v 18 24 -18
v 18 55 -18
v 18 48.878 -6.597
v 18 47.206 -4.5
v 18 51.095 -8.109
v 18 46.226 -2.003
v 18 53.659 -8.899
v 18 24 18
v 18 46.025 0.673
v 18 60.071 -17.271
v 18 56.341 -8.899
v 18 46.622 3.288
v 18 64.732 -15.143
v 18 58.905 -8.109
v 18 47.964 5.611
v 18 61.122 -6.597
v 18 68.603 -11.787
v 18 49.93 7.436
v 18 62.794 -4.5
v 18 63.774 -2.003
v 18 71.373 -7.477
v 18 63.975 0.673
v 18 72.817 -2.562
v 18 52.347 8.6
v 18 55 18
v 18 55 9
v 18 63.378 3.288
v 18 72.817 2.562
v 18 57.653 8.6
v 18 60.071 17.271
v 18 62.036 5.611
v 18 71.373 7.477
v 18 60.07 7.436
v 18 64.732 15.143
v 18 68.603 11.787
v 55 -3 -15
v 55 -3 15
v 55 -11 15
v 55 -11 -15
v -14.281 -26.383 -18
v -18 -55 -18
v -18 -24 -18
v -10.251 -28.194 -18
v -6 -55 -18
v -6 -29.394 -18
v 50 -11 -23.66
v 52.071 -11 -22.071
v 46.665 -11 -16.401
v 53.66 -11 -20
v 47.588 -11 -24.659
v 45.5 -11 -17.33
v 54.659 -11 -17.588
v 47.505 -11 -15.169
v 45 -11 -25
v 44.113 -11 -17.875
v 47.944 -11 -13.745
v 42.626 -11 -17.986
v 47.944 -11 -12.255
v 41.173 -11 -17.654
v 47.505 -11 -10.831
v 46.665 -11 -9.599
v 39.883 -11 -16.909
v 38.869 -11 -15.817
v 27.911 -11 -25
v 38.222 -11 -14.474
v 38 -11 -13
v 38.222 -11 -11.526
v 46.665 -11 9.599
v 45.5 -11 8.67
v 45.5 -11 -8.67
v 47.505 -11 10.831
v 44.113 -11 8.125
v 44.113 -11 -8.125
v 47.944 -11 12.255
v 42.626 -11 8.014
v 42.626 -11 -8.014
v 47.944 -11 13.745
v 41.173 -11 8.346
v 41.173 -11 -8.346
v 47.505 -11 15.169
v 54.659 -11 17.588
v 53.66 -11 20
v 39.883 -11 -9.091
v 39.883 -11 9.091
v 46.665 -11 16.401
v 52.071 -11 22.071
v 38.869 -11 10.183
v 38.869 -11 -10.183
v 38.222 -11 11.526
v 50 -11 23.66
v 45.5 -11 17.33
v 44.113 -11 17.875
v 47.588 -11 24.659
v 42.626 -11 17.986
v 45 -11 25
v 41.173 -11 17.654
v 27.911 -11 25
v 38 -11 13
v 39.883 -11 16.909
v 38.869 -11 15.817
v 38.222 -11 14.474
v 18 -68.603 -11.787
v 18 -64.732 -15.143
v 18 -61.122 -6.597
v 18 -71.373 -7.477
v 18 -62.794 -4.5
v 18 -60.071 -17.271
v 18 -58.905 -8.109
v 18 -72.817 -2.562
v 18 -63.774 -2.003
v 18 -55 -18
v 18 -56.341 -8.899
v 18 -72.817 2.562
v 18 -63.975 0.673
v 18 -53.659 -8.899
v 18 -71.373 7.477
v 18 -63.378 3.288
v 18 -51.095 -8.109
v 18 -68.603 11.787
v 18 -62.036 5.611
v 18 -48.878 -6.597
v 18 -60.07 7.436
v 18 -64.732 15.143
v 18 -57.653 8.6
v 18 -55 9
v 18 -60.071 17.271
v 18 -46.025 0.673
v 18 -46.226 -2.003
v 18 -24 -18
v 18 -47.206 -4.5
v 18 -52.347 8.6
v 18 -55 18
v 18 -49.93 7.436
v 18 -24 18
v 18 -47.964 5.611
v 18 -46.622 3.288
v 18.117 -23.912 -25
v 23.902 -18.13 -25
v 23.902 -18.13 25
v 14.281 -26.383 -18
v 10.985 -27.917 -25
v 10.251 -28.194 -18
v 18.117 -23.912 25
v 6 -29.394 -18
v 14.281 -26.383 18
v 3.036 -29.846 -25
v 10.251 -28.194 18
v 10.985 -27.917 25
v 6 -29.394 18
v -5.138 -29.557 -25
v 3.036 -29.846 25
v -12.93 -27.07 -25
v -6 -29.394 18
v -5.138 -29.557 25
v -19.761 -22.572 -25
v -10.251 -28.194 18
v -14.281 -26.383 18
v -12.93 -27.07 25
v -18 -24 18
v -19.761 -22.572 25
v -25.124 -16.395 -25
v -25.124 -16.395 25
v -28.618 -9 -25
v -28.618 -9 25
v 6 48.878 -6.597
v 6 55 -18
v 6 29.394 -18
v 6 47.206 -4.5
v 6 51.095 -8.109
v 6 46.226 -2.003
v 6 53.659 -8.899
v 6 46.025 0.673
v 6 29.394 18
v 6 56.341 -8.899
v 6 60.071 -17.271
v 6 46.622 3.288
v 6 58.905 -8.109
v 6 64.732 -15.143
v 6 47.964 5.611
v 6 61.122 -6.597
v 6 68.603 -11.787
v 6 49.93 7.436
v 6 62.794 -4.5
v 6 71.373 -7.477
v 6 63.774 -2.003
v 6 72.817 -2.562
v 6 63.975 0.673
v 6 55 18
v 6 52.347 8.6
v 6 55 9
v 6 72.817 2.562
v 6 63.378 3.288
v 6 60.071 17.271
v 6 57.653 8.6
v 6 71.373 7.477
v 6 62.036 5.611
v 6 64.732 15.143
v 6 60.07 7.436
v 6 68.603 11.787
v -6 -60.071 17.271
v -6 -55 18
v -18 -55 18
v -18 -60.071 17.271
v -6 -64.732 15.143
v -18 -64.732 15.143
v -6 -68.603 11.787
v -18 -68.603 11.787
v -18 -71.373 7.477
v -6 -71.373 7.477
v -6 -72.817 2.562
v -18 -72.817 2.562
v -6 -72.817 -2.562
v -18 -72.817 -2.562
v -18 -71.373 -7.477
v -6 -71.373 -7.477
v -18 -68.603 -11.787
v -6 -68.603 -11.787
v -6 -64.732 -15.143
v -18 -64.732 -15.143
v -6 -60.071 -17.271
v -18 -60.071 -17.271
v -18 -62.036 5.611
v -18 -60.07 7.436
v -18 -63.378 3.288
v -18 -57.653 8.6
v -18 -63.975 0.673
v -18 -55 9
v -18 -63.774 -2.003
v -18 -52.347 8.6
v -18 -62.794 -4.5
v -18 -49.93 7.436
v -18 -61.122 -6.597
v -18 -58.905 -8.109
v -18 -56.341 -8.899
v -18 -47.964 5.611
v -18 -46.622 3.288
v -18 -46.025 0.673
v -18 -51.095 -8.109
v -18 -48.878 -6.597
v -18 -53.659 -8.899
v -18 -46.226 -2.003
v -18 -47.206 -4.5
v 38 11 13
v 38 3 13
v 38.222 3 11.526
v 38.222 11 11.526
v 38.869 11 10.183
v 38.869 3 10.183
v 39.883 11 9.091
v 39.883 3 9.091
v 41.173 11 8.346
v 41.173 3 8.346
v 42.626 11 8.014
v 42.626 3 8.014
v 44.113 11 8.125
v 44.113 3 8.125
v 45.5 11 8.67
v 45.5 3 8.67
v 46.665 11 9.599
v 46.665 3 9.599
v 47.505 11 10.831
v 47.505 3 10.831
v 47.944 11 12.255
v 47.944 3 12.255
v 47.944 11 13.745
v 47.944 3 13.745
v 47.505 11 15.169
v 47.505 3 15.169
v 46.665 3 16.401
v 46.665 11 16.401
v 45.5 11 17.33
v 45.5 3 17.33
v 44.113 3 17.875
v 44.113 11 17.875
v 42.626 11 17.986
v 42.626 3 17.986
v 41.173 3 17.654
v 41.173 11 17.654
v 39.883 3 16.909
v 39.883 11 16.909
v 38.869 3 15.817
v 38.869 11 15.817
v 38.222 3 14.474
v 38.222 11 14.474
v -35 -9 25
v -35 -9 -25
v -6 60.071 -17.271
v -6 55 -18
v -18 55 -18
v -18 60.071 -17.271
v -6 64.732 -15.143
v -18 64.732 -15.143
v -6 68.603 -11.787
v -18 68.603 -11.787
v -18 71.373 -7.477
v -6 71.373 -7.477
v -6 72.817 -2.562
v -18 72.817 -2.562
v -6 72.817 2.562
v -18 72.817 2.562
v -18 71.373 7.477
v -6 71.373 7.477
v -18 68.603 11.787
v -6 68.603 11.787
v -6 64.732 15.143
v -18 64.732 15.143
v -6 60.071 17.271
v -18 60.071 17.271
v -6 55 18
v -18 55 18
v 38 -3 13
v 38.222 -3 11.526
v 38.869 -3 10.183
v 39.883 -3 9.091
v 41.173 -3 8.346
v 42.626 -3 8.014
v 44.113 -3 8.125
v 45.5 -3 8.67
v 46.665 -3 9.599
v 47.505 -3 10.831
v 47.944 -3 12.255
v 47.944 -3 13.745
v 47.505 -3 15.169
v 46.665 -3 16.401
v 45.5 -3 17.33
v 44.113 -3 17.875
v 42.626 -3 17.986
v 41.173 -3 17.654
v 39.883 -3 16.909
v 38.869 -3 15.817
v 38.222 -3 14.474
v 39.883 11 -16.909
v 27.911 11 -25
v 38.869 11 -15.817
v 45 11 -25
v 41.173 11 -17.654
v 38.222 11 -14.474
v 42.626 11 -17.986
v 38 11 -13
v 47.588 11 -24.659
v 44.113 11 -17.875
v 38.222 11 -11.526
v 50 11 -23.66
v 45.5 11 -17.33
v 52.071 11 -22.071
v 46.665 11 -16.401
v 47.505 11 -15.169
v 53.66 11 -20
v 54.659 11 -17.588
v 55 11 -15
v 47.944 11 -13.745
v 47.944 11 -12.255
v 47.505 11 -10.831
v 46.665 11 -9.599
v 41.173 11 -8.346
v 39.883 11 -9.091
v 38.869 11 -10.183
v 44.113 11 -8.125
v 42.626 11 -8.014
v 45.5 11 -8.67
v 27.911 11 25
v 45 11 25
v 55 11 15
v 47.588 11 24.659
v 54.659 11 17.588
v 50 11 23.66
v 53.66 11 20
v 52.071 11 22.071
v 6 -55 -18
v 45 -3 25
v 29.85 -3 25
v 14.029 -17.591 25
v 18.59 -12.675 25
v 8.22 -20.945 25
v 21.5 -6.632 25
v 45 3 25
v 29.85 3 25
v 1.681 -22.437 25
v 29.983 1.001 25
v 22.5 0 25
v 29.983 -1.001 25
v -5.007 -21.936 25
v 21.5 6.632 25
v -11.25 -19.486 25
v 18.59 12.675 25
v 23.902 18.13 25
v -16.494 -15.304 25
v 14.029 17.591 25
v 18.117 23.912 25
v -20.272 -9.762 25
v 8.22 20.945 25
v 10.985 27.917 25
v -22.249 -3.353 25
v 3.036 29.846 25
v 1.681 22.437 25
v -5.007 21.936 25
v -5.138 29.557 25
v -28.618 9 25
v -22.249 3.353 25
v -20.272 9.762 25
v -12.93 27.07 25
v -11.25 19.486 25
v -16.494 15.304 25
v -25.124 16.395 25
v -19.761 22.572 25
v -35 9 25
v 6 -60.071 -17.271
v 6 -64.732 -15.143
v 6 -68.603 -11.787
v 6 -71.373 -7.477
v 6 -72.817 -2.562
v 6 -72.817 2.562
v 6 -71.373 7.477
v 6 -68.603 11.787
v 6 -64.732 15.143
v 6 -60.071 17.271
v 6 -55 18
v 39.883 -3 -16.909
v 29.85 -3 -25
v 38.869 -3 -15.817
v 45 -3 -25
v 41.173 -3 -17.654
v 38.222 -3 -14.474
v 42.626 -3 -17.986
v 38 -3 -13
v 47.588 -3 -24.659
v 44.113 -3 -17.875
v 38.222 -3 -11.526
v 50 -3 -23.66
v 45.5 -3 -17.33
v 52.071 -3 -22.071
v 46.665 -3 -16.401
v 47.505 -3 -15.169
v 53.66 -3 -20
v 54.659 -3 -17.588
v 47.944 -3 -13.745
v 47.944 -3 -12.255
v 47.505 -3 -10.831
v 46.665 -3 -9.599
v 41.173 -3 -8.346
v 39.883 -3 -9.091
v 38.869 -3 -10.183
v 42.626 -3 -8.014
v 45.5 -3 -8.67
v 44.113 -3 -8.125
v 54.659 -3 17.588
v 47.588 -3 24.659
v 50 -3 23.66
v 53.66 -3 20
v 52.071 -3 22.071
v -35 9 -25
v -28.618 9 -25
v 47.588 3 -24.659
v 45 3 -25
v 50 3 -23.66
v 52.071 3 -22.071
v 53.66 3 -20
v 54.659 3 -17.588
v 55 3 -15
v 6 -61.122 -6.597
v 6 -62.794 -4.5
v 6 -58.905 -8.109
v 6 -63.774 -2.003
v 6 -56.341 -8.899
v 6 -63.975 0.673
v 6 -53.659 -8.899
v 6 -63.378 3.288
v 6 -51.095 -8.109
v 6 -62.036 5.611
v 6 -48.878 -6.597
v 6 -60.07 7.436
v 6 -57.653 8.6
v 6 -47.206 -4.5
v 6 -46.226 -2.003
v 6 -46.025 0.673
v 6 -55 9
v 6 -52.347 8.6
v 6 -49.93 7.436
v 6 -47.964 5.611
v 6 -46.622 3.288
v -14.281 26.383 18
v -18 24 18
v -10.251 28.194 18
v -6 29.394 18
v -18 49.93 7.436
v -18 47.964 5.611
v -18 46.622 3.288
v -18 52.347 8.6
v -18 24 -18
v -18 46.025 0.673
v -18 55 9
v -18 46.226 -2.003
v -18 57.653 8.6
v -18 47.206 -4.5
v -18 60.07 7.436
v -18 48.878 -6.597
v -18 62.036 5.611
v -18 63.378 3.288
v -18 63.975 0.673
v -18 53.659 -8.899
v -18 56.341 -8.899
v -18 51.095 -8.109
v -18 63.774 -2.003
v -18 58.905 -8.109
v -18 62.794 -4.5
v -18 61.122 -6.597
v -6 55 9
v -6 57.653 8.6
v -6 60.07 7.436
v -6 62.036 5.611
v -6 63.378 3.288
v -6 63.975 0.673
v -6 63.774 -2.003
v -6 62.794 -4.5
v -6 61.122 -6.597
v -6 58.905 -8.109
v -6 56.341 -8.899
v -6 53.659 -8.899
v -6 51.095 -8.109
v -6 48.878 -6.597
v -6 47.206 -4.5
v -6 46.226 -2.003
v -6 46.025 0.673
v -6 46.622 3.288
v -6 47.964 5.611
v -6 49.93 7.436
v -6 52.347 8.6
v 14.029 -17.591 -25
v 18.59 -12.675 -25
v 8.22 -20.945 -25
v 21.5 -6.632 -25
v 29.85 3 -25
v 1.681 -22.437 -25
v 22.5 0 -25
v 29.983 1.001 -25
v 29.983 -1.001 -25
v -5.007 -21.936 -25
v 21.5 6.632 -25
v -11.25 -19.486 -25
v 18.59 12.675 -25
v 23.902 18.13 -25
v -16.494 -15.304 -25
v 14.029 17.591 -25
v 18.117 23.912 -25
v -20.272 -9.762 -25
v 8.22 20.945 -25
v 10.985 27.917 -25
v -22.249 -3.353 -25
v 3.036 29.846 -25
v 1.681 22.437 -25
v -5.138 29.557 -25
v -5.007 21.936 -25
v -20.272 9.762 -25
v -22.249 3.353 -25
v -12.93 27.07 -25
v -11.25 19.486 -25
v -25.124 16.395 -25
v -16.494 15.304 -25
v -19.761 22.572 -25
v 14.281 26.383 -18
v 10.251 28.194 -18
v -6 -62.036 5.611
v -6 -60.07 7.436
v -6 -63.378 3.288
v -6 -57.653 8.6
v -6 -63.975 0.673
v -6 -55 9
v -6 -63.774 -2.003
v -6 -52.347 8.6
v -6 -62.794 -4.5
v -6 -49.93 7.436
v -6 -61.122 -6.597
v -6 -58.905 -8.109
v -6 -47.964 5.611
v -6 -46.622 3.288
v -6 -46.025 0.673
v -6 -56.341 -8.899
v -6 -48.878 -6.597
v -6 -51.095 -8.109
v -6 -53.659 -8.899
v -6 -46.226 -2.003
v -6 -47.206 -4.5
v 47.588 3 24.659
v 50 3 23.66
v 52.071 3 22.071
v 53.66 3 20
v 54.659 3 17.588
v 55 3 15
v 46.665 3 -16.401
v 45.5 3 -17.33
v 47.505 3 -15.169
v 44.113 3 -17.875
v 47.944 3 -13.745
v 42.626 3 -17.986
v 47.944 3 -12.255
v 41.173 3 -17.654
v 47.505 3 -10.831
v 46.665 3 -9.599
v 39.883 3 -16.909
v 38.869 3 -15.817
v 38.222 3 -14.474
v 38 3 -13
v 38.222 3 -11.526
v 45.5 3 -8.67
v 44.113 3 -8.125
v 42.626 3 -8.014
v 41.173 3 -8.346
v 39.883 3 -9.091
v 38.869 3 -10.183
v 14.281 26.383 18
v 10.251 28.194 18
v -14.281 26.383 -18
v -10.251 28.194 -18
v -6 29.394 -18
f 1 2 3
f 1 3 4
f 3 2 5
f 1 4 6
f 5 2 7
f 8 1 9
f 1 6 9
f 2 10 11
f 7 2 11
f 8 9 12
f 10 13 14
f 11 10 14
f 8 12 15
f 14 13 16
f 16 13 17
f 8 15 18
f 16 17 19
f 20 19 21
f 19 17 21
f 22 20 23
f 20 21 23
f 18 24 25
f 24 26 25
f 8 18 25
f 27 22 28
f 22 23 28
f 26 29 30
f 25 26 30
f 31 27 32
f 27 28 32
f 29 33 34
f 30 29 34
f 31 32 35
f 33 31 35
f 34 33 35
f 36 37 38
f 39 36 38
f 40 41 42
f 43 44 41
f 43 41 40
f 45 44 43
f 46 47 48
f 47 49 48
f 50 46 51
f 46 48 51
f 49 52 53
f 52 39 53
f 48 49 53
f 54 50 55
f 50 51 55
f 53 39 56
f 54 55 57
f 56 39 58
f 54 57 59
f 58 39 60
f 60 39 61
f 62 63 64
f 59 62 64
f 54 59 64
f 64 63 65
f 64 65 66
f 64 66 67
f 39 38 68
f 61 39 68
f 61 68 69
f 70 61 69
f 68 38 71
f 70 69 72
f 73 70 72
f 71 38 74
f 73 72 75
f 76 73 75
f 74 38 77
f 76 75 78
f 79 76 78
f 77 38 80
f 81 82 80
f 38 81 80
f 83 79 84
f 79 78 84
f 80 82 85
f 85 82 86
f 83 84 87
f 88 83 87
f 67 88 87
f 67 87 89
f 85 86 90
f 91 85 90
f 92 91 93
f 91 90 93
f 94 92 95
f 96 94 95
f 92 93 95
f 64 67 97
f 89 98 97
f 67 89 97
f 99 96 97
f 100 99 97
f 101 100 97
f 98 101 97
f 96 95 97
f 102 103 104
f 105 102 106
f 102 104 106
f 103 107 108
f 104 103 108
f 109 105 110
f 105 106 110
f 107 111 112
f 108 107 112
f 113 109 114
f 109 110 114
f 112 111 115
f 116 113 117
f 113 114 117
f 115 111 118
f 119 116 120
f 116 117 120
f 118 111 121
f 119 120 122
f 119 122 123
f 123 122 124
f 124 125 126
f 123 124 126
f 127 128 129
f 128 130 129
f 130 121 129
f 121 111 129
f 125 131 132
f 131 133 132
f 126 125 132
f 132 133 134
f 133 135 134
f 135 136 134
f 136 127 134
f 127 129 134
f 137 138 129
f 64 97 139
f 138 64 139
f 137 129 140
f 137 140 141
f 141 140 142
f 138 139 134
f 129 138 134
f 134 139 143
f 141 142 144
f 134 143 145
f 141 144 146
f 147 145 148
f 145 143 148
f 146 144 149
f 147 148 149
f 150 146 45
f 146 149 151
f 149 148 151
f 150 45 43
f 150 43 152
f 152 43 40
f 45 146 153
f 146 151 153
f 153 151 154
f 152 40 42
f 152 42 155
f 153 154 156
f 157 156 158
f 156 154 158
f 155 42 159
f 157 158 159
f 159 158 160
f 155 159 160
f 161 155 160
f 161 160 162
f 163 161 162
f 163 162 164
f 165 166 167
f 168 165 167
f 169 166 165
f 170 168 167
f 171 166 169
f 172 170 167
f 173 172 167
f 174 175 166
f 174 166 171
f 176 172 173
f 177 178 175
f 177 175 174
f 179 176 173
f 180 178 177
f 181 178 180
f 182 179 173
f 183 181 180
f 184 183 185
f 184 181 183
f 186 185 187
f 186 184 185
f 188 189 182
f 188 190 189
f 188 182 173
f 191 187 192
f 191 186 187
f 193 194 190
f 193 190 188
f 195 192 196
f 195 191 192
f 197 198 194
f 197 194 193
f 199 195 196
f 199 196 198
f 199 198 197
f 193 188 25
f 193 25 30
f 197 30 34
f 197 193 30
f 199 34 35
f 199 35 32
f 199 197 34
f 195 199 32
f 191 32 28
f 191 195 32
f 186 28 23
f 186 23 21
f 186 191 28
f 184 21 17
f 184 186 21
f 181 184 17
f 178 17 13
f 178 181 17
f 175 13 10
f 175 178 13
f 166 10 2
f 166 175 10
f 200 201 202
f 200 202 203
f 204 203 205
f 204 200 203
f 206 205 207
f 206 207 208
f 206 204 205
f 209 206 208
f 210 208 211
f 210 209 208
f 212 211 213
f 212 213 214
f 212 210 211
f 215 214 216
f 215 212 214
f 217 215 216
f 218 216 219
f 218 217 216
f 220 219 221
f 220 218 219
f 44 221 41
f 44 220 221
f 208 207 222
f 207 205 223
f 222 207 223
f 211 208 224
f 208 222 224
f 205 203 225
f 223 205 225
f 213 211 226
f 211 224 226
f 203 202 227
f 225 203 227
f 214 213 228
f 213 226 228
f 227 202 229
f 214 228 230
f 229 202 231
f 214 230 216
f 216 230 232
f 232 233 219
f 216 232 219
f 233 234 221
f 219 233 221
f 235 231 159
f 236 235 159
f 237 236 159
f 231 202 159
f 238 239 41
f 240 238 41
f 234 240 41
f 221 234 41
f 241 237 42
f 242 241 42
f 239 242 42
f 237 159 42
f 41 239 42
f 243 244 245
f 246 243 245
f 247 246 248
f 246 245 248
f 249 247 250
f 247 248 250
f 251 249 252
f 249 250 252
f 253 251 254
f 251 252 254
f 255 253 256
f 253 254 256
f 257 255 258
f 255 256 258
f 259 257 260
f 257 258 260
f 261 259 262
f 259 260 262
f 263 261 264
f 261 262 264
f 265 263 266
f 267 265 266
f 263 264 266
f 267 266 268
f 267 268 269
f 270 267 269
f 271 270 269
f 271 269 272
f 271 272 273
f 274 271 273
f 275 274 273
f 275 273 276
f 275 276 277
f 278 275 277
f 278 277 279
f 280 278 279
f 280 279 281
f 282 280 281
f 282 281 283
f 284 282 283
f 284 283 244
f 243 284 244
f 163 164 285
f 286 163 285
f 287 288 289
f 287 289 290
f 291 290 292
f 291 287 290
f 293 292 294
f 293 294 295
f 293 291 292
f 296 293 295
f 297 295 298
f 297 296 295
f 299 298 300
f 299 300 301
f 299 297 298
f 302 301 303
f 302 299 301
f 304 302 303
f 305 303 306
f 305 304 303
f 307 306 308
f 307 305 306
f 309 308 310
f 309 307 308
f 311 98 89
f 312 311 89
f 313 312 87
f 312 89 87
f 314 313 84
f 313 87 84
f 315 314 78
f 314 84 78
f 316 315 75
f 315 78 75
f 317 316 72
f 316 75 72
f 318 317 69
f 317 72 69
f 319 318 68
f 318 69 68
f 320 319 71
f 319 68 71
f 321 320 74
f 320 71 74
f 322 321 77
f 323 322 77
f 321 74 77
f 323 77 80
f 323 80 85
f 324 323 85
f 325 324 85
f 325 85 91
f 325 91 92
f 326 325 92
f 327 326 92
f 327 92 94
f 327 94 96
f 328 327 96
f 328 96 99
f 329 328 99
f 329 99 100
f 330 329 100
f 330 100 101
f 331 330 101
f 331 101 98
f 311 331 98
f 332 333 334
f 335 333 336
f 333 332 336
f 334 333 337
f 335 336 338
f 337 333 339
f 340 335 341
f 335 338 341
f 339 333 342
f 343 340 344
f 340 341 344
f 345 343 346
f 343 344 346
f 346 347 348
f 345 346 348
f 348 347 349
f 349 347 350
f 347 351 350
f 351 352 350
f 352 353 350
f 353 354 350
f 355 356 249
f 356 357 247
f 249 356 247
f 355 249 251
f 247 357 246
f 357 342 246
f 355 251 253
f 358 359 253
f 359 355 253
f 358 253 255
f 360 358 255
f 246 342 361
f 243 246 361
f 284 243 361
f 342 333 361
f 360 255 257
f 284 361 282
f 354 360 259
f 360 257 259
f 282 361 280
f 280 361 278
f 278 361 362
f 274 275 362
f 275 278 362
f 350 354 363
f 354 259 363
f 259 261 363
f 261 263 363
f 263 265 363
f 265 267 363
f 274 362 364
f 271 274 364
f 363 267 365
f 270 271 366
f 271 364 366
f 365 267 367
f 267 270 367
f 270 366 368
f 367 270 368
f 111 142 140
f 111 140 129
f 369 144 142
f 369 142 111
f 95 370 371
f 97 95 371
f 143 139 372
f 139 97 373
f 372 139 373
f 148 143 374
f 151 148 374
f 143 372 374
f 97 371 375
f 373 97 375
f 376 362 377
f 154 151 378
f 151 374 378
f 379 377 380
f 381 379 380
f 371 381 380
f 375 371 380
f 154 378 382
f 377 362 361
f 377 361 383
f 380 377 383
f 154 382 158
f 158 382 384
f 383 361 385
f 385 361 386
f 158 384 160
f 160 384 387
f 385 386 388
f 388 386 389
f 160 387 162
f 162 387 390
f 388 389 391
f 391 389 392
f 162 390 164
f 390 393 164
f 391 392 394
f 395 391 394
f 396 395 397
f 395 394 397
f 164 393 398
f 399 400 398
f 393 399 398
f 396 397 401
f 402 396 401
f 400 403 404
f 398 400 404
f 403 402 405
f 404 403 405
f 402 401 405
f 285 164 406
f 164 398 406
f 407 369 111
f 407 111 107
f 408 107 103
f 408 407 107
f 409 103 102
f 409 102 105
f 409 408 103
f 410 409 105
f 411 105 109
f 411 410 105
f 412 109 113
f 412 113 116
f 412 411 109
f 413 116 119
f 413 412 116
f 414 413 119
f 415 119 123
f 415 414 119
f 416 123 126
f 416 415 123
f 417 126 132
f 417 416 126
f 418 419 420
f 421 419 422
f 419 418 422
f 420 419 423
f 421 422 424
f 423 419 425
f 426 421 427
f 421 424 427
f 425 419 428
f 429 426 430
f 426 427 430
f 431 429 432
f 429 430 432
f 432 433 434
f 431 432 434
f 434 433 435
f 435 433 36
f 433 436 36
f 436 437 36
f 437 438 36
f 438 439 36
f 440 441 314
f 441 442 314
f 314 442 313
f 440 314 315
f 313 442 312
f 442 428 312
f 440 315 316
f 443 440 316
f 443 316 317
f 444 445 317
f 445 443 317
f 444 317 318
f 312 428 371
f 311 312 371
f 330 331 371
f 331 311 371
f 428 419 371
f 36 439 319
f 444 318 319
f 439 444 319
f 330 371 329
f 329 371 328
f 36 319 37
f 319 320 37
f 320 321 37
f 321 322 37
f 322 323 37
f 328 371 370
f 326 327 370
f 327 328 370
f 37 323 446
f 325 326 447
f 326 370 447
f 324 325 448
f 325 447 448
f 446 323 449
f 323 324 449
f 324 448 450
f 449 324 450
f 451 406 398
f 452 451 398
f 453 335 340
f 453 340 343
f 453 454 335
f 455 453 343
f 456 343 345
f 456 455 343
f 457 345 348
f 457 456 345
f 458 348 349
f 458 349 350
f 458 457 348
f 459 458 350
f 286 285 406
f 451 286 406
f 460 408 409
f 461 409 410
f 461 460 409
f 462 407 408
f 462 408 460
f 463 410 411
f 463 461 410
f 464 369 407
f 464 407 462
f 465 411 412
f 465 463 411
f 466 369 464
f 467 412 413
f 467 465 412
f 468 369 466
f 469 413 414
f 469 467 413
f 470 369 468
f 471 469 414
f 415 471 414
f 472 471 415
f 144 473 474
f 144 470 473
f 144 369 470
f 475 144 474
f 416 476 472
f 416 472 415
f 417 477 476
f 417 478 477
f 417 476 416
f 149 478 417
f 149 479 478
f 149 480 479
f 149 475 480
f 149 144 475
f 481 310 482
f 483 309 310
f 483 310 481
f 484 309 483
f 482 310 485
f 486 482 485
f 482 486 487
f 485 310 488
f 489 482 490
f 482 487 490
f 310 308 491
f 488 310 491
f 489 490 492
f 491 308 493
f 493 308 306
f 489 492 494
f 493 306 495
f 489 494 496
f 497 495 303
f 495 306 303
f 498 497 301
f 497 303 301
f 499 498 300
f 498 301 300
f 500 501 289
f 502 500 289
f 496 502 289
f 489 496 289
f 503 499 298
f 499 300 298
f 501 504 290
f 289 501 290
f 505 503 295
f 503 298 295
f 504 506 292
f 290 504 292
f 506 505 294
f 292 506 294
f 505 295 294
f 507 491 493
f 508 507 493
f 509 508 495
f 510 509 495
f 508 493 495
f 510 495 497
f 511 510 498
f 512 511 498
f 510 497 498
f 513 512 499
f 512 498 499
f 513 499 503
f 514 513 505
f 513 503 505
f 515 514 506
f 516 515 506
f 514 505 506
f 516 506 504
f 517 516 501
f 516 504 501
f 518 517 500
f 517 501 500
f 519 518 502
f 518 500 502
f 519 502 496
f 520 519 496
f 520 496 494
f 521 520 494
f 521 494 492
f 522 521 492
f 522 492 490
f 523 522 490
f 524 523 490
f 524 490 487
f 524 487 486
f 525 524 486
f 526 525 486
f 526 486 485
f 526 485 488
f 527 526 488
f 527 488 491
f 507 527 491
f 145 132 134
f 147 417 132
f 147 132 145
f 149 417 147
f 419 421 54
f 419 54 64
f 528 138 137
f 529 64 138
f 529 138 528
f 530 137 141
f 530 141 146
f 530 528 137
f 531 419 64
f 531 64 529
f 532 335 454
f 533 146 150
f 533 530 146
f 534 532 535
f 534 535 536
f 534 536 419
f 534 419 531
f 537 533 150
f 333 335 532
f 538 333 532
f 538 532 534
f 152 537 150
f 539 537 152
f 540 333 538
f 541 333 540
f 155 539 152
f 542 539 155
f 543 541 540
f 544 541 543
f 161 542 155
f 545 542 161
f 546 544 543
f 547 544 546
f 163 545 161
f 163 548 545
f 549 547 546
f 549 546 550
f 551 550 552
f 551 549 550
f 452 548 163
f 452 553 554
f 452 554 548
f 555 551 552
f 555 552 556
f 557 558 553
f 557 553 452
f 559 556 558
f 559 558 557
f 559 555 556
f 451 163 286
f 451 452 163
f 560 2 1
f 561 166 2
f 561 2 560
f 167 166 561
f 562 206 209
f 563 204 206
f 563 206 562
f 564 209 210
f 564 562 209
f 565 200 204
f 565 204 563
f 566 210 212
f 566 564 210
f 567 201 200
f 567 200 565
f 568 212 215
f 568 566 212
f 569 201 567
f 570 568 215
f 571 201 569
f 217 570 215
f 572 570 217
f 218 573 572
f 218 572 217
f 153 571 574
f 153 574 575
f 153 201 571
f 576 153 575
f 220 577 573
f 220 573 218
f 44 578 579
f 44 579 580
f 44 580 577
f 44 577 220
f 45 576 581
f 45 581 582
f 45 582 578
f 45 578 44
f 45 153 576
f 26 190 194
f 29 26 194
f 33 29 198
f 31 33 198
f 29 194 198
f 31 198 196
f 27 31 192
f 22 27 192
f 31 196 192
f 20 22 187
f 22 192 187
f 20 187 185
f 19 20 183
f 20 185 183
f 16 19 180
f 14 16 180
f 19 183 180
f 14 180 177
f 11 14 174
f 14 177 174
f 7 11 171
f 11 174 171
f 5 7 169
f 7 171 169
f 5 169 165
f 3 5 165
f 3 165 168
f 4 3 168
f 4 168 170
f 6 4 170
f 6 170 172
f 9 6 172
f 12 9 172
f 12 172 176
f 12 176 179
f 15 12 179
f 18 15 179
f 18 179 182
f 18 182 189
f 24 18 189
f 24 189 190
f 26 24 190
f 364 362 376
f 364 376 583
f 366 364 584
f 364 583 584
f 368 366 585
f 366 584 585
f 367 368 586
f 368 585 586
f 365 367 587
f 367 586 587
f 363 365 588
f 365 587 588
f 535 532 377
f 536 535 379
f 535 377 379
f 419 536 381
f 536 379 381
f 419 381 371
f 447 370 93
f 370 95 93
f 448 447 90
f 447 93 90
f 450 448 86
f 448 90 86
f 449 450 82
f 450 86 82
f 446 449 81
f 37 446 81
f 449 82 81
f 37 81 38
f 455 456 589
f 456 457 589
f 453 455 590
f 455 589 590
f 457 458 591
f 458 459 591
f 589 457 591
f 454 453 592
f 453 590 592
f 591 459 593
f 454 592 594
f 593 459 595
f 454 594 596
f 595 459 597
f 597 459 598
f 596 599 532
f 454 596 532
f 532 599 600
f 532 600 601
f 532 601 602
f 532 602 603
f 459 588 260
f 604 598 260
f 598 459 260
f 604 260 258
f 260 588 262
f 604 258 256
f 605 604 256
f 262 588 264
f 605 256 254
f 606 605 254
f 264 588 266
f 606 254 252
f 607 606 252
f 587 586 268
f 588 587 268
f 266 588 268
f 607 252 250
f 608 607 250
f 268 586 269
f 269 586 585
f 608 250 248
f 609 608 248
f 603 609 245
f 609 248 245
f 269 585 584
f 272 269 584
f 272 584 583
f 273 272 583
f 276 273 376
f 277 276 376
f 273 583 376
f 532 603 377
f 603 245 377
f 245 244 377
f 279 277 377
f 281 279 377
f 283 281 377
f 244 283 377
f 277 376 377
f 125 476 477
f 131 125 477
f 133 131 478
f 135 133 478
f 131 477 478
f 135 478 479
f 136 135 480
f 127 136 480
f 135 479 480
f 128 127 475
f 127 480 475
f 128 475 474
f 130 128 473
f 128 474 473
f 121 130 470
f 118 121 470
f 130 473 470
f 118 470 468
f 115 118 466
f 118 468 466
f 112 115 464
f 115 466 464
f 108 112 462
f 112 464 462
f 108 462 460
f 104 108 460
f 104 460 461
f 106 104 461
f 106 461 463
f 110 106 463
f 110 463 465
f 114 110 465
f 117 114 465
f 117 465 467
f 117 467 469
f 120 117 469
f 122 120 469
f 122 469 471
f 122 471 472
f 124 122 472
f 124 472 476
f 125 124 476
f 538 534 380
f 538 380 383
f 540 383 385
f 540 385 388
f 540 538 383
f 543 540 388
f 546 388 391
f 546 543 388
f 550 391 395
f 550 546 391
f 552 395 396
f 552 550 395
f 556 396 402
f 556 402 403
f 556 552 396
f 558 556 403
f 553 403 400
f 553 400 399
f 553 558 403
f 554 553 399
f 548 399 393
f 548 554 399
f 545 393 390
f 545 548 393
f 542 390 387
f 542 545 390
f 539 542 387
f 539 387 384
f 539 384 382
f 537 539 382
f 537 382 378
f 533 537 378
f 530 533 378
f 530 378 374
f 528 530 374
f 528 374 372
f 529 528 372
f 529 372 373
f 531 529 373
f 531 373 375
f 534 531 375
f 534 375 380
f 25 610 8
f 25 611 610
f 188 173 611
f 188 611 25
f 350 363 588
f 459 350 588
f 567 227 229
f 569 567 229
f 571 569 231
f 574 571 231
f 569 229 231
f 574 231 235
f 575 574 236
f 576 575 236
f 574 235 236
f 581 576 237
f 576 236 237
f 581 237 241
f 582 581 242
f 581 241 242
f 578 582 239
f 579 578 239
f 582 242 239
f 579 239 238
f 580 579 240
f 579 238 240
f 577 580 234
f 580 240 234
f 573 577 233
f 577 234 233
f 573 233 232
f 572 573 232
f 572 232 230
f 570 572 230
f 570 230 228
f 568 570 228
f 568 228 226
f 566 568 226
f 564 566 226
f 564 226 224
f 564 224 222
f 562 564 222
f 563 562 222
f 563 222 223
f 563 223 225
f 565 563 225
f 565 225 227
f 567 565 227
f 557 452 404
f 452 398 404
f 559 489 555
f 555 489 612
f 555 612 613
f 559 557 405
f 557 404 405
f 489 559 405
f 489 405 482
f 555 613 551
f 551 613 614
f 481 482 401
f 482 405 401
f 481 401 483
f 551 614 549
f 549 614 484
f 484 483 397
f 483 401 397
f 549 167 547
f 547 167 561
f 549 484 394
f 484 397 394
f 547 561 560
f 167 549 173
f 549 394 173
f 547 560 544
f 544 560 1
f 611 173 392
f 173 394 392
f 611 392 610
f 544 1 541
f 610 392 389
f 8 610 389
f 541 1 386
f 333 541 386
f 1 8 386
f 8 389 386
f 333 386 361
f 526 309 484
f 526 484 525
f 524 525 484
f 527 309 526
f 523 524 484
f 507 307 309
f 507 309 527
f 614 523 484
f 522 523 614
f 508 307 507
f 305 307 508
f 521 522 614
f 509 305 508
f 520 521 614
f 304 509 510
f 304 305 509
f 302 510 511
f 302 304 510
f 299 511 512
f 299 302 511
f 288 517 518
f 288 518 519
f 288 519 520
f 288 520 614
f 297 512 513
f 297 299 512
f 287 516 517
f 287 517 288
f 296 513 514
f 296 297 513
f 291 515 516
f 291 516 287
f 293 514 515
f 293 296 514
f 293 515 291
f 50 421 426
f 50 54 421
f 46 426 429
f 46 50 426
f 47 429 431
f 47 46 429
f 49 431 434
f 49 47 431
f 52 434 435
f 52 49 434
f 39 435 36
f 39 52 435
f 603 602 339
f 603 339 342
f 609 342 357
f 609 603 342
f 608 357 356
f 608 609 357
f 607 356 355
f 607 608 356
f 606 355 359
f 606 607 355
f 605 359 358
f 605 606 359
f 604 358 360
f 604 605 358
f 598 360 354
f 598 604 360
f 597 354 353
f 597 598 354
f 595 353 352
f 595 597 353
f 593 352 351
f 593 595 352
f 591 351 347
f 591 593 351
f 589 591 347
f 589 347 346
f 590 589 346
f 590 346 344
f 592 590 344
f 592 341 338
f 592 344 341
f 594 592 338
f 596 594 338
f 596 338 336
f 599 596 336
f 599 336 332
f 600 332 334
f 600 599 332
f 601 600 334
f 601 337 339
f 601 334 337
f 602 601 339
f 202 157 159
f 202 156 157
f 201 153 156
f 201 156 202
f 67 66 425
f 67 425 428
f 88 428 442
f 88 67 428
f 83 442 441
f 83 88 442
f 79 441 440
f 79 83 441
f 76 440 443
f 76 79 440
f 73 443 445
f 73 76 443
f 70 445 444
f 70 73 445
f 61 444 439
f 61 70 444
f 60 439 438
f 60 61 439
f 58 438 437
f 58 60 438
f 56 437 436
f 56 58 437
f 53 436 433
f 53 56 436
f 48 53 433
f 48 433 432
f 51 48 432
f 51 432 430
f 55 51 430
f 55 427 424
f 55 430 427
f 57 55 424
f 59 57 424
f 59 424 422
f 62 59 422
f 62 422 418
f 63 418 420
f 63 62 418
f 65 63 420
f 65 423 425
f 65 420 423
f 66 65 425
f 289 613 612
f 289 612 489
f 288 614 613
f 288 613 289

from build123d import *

# Parameters (mm, degrees)
BOSS_EXTRUDE1_START     = 6
BOSS_EXTRUDE1_DEPTH     = 12
BOSS_EXTRUDE2_START     = -6
BOSS_EXTRUDE2_DEPTH     = 12
SKETCH3_R               = 22.5
BOSS_EXTRUDE3_DEPTH     = 25
HOLE1_D                 = 18
HOLE2_D                 = 18
HOLE3_D                 = 10
FILLET1_R               = 10
CUT_EXTRUDE1_DEPTH      = 95.757585448
CUT_EXTRUDE1_DEPTH_BACK = 95.757585448
SKETCH11_R              = 22.5


with BuildPart() as part:
    # Sketch1 → Boss-Extrude1 (new body)
    with BuildSketch(Plane(origin=(0, 0, 0), x_dir=(0, 0, -1), z_dir=(1, 0, 0)).offset(BOSS_EXTRUDE1_START)):
        with BuildLine():
            Line((18, 55), (18, -55))
            ThreePointArc((18, -55), (0, -73), (-18, -55))
            Line((-18, -55), (-18, 55))
            ThreePointArc((-18, 55), (0, 73), (18, 55))
        make_face()
    extrude(amount=BOSS_EXTRUDE1_DEPTH)



with BuildPart() as body_2:
    # Sketch2 → Boss-Extrude2 (new body)
    with BuildSketch(Plane(origin=(0, 0, 0), x_dir=(0, 0, -1), z_dir=(1, 0, 0)).offset(BOSS_EXTRUDE2_START)):
        with BuildLine():
            Line((18, -55), (18, 55))
            ThreePointArc((18, 55), (0, 73), (-18, 55))
            Line((-18, 55), (-18, -55))
            ThreePointArc((-18, -55), (0, -73), (18, -55))
        make_face()
    extrude(amount=-BOSS_EXTRUDE2_DEPTH)


with BuildPart() as part_1:
    add(part.part)

    add(body_2.part)  # Boss-Extrude3 merges body 2
    # Sketch3 → Boss-Extrude3 (add, symmetric)
    with BuildSketch(Plane.XY):
        with BuildLine():
            Line((-35, 9), (-28.618176043, 9))
            ThreePointArc((-28.618176043, 9), (-1.060743162, 29.981241201), (27.910571474, 11))
            Line((27.910571474, 11), (55, 11))
            Line((55, 11), (55, 3))
            Line((55, 3), (29.849623113, 3))
            ThreePointArc((29.849623113, 3), (30, 0), (29.849623113, -3))
            Line((29.849623113, -3), (55, -3))
            Line((55, -3), (55, -11))
            Line((55, -11), (27.910571474, -11))
            ThreePointArc((27.910571474, -11), (-1.060743162, -29.981241201), (-28.618176043, -9))
            Line((-28.618176043, -9), (-35, -9))
            Line((-35, -9), (-35, 9))
        make_face()
        Circle(SKETCH3_R, mode=Mode.SUBTRACT)
    extrude(amount=BOSS_EXTRUDE3_DEPTH, both=True)

    # Hole1 (through all)
    with Locations(Plane(origin=(18, 0, 0), x_dir=(0, 0, -1), z_dir=(1, 0, 0))):
        with Locations((0, 55)):
            Hole(HOLE1_D / 2)

    # Hole2 (through all)
    with Locations(Plane(origin=(18, 0, 0), x_dir=(0, 0, -1), z_dir=(1, 0, 0))):
        with Locations((0, -55)):
            Hole(HOLE2_D / 2)

    # Hole3 (through all)
    with Locations(Plane(origin=(0, 11, 0), x_dir=(1, 0, 0), z_dir=(0, 1, 0))):
        with Locations((43, -13)):
            hole3 = Hole(HOLE3_D / 2)

    # Mirror2: Hole3 across plane
    add(hole3.mirror(Plane.XY), mode=Mode.SUBTRACT)

    # Fillet1
    fillet1_edges = [part_1.edges().sort_by_distance(p)[0] for p in [
        (55, -7, 25),
        (55, 7, 25),
        (55, -7, -25),
        (55, 7, -25),
    ]]
    fillet(fillet1_edges, radius=FILLET1_R)

    # Sketch11 → Cut-Extrude1 (cut, two sides: drawn at the far end of the back side and taken through both)
    with BuildSketch(Plane.XY.offset(-CUT_EXTRUDE1_DEPTH_BACK)):
        Circle(SKETCH11_R)
    extrude(amount=CUT_EXTRUDE1_DEPTH + CUT_EXTRUDE1_DEPTH_BACK, mode=Mode.SUBTRACT)


solid = part_1.part
